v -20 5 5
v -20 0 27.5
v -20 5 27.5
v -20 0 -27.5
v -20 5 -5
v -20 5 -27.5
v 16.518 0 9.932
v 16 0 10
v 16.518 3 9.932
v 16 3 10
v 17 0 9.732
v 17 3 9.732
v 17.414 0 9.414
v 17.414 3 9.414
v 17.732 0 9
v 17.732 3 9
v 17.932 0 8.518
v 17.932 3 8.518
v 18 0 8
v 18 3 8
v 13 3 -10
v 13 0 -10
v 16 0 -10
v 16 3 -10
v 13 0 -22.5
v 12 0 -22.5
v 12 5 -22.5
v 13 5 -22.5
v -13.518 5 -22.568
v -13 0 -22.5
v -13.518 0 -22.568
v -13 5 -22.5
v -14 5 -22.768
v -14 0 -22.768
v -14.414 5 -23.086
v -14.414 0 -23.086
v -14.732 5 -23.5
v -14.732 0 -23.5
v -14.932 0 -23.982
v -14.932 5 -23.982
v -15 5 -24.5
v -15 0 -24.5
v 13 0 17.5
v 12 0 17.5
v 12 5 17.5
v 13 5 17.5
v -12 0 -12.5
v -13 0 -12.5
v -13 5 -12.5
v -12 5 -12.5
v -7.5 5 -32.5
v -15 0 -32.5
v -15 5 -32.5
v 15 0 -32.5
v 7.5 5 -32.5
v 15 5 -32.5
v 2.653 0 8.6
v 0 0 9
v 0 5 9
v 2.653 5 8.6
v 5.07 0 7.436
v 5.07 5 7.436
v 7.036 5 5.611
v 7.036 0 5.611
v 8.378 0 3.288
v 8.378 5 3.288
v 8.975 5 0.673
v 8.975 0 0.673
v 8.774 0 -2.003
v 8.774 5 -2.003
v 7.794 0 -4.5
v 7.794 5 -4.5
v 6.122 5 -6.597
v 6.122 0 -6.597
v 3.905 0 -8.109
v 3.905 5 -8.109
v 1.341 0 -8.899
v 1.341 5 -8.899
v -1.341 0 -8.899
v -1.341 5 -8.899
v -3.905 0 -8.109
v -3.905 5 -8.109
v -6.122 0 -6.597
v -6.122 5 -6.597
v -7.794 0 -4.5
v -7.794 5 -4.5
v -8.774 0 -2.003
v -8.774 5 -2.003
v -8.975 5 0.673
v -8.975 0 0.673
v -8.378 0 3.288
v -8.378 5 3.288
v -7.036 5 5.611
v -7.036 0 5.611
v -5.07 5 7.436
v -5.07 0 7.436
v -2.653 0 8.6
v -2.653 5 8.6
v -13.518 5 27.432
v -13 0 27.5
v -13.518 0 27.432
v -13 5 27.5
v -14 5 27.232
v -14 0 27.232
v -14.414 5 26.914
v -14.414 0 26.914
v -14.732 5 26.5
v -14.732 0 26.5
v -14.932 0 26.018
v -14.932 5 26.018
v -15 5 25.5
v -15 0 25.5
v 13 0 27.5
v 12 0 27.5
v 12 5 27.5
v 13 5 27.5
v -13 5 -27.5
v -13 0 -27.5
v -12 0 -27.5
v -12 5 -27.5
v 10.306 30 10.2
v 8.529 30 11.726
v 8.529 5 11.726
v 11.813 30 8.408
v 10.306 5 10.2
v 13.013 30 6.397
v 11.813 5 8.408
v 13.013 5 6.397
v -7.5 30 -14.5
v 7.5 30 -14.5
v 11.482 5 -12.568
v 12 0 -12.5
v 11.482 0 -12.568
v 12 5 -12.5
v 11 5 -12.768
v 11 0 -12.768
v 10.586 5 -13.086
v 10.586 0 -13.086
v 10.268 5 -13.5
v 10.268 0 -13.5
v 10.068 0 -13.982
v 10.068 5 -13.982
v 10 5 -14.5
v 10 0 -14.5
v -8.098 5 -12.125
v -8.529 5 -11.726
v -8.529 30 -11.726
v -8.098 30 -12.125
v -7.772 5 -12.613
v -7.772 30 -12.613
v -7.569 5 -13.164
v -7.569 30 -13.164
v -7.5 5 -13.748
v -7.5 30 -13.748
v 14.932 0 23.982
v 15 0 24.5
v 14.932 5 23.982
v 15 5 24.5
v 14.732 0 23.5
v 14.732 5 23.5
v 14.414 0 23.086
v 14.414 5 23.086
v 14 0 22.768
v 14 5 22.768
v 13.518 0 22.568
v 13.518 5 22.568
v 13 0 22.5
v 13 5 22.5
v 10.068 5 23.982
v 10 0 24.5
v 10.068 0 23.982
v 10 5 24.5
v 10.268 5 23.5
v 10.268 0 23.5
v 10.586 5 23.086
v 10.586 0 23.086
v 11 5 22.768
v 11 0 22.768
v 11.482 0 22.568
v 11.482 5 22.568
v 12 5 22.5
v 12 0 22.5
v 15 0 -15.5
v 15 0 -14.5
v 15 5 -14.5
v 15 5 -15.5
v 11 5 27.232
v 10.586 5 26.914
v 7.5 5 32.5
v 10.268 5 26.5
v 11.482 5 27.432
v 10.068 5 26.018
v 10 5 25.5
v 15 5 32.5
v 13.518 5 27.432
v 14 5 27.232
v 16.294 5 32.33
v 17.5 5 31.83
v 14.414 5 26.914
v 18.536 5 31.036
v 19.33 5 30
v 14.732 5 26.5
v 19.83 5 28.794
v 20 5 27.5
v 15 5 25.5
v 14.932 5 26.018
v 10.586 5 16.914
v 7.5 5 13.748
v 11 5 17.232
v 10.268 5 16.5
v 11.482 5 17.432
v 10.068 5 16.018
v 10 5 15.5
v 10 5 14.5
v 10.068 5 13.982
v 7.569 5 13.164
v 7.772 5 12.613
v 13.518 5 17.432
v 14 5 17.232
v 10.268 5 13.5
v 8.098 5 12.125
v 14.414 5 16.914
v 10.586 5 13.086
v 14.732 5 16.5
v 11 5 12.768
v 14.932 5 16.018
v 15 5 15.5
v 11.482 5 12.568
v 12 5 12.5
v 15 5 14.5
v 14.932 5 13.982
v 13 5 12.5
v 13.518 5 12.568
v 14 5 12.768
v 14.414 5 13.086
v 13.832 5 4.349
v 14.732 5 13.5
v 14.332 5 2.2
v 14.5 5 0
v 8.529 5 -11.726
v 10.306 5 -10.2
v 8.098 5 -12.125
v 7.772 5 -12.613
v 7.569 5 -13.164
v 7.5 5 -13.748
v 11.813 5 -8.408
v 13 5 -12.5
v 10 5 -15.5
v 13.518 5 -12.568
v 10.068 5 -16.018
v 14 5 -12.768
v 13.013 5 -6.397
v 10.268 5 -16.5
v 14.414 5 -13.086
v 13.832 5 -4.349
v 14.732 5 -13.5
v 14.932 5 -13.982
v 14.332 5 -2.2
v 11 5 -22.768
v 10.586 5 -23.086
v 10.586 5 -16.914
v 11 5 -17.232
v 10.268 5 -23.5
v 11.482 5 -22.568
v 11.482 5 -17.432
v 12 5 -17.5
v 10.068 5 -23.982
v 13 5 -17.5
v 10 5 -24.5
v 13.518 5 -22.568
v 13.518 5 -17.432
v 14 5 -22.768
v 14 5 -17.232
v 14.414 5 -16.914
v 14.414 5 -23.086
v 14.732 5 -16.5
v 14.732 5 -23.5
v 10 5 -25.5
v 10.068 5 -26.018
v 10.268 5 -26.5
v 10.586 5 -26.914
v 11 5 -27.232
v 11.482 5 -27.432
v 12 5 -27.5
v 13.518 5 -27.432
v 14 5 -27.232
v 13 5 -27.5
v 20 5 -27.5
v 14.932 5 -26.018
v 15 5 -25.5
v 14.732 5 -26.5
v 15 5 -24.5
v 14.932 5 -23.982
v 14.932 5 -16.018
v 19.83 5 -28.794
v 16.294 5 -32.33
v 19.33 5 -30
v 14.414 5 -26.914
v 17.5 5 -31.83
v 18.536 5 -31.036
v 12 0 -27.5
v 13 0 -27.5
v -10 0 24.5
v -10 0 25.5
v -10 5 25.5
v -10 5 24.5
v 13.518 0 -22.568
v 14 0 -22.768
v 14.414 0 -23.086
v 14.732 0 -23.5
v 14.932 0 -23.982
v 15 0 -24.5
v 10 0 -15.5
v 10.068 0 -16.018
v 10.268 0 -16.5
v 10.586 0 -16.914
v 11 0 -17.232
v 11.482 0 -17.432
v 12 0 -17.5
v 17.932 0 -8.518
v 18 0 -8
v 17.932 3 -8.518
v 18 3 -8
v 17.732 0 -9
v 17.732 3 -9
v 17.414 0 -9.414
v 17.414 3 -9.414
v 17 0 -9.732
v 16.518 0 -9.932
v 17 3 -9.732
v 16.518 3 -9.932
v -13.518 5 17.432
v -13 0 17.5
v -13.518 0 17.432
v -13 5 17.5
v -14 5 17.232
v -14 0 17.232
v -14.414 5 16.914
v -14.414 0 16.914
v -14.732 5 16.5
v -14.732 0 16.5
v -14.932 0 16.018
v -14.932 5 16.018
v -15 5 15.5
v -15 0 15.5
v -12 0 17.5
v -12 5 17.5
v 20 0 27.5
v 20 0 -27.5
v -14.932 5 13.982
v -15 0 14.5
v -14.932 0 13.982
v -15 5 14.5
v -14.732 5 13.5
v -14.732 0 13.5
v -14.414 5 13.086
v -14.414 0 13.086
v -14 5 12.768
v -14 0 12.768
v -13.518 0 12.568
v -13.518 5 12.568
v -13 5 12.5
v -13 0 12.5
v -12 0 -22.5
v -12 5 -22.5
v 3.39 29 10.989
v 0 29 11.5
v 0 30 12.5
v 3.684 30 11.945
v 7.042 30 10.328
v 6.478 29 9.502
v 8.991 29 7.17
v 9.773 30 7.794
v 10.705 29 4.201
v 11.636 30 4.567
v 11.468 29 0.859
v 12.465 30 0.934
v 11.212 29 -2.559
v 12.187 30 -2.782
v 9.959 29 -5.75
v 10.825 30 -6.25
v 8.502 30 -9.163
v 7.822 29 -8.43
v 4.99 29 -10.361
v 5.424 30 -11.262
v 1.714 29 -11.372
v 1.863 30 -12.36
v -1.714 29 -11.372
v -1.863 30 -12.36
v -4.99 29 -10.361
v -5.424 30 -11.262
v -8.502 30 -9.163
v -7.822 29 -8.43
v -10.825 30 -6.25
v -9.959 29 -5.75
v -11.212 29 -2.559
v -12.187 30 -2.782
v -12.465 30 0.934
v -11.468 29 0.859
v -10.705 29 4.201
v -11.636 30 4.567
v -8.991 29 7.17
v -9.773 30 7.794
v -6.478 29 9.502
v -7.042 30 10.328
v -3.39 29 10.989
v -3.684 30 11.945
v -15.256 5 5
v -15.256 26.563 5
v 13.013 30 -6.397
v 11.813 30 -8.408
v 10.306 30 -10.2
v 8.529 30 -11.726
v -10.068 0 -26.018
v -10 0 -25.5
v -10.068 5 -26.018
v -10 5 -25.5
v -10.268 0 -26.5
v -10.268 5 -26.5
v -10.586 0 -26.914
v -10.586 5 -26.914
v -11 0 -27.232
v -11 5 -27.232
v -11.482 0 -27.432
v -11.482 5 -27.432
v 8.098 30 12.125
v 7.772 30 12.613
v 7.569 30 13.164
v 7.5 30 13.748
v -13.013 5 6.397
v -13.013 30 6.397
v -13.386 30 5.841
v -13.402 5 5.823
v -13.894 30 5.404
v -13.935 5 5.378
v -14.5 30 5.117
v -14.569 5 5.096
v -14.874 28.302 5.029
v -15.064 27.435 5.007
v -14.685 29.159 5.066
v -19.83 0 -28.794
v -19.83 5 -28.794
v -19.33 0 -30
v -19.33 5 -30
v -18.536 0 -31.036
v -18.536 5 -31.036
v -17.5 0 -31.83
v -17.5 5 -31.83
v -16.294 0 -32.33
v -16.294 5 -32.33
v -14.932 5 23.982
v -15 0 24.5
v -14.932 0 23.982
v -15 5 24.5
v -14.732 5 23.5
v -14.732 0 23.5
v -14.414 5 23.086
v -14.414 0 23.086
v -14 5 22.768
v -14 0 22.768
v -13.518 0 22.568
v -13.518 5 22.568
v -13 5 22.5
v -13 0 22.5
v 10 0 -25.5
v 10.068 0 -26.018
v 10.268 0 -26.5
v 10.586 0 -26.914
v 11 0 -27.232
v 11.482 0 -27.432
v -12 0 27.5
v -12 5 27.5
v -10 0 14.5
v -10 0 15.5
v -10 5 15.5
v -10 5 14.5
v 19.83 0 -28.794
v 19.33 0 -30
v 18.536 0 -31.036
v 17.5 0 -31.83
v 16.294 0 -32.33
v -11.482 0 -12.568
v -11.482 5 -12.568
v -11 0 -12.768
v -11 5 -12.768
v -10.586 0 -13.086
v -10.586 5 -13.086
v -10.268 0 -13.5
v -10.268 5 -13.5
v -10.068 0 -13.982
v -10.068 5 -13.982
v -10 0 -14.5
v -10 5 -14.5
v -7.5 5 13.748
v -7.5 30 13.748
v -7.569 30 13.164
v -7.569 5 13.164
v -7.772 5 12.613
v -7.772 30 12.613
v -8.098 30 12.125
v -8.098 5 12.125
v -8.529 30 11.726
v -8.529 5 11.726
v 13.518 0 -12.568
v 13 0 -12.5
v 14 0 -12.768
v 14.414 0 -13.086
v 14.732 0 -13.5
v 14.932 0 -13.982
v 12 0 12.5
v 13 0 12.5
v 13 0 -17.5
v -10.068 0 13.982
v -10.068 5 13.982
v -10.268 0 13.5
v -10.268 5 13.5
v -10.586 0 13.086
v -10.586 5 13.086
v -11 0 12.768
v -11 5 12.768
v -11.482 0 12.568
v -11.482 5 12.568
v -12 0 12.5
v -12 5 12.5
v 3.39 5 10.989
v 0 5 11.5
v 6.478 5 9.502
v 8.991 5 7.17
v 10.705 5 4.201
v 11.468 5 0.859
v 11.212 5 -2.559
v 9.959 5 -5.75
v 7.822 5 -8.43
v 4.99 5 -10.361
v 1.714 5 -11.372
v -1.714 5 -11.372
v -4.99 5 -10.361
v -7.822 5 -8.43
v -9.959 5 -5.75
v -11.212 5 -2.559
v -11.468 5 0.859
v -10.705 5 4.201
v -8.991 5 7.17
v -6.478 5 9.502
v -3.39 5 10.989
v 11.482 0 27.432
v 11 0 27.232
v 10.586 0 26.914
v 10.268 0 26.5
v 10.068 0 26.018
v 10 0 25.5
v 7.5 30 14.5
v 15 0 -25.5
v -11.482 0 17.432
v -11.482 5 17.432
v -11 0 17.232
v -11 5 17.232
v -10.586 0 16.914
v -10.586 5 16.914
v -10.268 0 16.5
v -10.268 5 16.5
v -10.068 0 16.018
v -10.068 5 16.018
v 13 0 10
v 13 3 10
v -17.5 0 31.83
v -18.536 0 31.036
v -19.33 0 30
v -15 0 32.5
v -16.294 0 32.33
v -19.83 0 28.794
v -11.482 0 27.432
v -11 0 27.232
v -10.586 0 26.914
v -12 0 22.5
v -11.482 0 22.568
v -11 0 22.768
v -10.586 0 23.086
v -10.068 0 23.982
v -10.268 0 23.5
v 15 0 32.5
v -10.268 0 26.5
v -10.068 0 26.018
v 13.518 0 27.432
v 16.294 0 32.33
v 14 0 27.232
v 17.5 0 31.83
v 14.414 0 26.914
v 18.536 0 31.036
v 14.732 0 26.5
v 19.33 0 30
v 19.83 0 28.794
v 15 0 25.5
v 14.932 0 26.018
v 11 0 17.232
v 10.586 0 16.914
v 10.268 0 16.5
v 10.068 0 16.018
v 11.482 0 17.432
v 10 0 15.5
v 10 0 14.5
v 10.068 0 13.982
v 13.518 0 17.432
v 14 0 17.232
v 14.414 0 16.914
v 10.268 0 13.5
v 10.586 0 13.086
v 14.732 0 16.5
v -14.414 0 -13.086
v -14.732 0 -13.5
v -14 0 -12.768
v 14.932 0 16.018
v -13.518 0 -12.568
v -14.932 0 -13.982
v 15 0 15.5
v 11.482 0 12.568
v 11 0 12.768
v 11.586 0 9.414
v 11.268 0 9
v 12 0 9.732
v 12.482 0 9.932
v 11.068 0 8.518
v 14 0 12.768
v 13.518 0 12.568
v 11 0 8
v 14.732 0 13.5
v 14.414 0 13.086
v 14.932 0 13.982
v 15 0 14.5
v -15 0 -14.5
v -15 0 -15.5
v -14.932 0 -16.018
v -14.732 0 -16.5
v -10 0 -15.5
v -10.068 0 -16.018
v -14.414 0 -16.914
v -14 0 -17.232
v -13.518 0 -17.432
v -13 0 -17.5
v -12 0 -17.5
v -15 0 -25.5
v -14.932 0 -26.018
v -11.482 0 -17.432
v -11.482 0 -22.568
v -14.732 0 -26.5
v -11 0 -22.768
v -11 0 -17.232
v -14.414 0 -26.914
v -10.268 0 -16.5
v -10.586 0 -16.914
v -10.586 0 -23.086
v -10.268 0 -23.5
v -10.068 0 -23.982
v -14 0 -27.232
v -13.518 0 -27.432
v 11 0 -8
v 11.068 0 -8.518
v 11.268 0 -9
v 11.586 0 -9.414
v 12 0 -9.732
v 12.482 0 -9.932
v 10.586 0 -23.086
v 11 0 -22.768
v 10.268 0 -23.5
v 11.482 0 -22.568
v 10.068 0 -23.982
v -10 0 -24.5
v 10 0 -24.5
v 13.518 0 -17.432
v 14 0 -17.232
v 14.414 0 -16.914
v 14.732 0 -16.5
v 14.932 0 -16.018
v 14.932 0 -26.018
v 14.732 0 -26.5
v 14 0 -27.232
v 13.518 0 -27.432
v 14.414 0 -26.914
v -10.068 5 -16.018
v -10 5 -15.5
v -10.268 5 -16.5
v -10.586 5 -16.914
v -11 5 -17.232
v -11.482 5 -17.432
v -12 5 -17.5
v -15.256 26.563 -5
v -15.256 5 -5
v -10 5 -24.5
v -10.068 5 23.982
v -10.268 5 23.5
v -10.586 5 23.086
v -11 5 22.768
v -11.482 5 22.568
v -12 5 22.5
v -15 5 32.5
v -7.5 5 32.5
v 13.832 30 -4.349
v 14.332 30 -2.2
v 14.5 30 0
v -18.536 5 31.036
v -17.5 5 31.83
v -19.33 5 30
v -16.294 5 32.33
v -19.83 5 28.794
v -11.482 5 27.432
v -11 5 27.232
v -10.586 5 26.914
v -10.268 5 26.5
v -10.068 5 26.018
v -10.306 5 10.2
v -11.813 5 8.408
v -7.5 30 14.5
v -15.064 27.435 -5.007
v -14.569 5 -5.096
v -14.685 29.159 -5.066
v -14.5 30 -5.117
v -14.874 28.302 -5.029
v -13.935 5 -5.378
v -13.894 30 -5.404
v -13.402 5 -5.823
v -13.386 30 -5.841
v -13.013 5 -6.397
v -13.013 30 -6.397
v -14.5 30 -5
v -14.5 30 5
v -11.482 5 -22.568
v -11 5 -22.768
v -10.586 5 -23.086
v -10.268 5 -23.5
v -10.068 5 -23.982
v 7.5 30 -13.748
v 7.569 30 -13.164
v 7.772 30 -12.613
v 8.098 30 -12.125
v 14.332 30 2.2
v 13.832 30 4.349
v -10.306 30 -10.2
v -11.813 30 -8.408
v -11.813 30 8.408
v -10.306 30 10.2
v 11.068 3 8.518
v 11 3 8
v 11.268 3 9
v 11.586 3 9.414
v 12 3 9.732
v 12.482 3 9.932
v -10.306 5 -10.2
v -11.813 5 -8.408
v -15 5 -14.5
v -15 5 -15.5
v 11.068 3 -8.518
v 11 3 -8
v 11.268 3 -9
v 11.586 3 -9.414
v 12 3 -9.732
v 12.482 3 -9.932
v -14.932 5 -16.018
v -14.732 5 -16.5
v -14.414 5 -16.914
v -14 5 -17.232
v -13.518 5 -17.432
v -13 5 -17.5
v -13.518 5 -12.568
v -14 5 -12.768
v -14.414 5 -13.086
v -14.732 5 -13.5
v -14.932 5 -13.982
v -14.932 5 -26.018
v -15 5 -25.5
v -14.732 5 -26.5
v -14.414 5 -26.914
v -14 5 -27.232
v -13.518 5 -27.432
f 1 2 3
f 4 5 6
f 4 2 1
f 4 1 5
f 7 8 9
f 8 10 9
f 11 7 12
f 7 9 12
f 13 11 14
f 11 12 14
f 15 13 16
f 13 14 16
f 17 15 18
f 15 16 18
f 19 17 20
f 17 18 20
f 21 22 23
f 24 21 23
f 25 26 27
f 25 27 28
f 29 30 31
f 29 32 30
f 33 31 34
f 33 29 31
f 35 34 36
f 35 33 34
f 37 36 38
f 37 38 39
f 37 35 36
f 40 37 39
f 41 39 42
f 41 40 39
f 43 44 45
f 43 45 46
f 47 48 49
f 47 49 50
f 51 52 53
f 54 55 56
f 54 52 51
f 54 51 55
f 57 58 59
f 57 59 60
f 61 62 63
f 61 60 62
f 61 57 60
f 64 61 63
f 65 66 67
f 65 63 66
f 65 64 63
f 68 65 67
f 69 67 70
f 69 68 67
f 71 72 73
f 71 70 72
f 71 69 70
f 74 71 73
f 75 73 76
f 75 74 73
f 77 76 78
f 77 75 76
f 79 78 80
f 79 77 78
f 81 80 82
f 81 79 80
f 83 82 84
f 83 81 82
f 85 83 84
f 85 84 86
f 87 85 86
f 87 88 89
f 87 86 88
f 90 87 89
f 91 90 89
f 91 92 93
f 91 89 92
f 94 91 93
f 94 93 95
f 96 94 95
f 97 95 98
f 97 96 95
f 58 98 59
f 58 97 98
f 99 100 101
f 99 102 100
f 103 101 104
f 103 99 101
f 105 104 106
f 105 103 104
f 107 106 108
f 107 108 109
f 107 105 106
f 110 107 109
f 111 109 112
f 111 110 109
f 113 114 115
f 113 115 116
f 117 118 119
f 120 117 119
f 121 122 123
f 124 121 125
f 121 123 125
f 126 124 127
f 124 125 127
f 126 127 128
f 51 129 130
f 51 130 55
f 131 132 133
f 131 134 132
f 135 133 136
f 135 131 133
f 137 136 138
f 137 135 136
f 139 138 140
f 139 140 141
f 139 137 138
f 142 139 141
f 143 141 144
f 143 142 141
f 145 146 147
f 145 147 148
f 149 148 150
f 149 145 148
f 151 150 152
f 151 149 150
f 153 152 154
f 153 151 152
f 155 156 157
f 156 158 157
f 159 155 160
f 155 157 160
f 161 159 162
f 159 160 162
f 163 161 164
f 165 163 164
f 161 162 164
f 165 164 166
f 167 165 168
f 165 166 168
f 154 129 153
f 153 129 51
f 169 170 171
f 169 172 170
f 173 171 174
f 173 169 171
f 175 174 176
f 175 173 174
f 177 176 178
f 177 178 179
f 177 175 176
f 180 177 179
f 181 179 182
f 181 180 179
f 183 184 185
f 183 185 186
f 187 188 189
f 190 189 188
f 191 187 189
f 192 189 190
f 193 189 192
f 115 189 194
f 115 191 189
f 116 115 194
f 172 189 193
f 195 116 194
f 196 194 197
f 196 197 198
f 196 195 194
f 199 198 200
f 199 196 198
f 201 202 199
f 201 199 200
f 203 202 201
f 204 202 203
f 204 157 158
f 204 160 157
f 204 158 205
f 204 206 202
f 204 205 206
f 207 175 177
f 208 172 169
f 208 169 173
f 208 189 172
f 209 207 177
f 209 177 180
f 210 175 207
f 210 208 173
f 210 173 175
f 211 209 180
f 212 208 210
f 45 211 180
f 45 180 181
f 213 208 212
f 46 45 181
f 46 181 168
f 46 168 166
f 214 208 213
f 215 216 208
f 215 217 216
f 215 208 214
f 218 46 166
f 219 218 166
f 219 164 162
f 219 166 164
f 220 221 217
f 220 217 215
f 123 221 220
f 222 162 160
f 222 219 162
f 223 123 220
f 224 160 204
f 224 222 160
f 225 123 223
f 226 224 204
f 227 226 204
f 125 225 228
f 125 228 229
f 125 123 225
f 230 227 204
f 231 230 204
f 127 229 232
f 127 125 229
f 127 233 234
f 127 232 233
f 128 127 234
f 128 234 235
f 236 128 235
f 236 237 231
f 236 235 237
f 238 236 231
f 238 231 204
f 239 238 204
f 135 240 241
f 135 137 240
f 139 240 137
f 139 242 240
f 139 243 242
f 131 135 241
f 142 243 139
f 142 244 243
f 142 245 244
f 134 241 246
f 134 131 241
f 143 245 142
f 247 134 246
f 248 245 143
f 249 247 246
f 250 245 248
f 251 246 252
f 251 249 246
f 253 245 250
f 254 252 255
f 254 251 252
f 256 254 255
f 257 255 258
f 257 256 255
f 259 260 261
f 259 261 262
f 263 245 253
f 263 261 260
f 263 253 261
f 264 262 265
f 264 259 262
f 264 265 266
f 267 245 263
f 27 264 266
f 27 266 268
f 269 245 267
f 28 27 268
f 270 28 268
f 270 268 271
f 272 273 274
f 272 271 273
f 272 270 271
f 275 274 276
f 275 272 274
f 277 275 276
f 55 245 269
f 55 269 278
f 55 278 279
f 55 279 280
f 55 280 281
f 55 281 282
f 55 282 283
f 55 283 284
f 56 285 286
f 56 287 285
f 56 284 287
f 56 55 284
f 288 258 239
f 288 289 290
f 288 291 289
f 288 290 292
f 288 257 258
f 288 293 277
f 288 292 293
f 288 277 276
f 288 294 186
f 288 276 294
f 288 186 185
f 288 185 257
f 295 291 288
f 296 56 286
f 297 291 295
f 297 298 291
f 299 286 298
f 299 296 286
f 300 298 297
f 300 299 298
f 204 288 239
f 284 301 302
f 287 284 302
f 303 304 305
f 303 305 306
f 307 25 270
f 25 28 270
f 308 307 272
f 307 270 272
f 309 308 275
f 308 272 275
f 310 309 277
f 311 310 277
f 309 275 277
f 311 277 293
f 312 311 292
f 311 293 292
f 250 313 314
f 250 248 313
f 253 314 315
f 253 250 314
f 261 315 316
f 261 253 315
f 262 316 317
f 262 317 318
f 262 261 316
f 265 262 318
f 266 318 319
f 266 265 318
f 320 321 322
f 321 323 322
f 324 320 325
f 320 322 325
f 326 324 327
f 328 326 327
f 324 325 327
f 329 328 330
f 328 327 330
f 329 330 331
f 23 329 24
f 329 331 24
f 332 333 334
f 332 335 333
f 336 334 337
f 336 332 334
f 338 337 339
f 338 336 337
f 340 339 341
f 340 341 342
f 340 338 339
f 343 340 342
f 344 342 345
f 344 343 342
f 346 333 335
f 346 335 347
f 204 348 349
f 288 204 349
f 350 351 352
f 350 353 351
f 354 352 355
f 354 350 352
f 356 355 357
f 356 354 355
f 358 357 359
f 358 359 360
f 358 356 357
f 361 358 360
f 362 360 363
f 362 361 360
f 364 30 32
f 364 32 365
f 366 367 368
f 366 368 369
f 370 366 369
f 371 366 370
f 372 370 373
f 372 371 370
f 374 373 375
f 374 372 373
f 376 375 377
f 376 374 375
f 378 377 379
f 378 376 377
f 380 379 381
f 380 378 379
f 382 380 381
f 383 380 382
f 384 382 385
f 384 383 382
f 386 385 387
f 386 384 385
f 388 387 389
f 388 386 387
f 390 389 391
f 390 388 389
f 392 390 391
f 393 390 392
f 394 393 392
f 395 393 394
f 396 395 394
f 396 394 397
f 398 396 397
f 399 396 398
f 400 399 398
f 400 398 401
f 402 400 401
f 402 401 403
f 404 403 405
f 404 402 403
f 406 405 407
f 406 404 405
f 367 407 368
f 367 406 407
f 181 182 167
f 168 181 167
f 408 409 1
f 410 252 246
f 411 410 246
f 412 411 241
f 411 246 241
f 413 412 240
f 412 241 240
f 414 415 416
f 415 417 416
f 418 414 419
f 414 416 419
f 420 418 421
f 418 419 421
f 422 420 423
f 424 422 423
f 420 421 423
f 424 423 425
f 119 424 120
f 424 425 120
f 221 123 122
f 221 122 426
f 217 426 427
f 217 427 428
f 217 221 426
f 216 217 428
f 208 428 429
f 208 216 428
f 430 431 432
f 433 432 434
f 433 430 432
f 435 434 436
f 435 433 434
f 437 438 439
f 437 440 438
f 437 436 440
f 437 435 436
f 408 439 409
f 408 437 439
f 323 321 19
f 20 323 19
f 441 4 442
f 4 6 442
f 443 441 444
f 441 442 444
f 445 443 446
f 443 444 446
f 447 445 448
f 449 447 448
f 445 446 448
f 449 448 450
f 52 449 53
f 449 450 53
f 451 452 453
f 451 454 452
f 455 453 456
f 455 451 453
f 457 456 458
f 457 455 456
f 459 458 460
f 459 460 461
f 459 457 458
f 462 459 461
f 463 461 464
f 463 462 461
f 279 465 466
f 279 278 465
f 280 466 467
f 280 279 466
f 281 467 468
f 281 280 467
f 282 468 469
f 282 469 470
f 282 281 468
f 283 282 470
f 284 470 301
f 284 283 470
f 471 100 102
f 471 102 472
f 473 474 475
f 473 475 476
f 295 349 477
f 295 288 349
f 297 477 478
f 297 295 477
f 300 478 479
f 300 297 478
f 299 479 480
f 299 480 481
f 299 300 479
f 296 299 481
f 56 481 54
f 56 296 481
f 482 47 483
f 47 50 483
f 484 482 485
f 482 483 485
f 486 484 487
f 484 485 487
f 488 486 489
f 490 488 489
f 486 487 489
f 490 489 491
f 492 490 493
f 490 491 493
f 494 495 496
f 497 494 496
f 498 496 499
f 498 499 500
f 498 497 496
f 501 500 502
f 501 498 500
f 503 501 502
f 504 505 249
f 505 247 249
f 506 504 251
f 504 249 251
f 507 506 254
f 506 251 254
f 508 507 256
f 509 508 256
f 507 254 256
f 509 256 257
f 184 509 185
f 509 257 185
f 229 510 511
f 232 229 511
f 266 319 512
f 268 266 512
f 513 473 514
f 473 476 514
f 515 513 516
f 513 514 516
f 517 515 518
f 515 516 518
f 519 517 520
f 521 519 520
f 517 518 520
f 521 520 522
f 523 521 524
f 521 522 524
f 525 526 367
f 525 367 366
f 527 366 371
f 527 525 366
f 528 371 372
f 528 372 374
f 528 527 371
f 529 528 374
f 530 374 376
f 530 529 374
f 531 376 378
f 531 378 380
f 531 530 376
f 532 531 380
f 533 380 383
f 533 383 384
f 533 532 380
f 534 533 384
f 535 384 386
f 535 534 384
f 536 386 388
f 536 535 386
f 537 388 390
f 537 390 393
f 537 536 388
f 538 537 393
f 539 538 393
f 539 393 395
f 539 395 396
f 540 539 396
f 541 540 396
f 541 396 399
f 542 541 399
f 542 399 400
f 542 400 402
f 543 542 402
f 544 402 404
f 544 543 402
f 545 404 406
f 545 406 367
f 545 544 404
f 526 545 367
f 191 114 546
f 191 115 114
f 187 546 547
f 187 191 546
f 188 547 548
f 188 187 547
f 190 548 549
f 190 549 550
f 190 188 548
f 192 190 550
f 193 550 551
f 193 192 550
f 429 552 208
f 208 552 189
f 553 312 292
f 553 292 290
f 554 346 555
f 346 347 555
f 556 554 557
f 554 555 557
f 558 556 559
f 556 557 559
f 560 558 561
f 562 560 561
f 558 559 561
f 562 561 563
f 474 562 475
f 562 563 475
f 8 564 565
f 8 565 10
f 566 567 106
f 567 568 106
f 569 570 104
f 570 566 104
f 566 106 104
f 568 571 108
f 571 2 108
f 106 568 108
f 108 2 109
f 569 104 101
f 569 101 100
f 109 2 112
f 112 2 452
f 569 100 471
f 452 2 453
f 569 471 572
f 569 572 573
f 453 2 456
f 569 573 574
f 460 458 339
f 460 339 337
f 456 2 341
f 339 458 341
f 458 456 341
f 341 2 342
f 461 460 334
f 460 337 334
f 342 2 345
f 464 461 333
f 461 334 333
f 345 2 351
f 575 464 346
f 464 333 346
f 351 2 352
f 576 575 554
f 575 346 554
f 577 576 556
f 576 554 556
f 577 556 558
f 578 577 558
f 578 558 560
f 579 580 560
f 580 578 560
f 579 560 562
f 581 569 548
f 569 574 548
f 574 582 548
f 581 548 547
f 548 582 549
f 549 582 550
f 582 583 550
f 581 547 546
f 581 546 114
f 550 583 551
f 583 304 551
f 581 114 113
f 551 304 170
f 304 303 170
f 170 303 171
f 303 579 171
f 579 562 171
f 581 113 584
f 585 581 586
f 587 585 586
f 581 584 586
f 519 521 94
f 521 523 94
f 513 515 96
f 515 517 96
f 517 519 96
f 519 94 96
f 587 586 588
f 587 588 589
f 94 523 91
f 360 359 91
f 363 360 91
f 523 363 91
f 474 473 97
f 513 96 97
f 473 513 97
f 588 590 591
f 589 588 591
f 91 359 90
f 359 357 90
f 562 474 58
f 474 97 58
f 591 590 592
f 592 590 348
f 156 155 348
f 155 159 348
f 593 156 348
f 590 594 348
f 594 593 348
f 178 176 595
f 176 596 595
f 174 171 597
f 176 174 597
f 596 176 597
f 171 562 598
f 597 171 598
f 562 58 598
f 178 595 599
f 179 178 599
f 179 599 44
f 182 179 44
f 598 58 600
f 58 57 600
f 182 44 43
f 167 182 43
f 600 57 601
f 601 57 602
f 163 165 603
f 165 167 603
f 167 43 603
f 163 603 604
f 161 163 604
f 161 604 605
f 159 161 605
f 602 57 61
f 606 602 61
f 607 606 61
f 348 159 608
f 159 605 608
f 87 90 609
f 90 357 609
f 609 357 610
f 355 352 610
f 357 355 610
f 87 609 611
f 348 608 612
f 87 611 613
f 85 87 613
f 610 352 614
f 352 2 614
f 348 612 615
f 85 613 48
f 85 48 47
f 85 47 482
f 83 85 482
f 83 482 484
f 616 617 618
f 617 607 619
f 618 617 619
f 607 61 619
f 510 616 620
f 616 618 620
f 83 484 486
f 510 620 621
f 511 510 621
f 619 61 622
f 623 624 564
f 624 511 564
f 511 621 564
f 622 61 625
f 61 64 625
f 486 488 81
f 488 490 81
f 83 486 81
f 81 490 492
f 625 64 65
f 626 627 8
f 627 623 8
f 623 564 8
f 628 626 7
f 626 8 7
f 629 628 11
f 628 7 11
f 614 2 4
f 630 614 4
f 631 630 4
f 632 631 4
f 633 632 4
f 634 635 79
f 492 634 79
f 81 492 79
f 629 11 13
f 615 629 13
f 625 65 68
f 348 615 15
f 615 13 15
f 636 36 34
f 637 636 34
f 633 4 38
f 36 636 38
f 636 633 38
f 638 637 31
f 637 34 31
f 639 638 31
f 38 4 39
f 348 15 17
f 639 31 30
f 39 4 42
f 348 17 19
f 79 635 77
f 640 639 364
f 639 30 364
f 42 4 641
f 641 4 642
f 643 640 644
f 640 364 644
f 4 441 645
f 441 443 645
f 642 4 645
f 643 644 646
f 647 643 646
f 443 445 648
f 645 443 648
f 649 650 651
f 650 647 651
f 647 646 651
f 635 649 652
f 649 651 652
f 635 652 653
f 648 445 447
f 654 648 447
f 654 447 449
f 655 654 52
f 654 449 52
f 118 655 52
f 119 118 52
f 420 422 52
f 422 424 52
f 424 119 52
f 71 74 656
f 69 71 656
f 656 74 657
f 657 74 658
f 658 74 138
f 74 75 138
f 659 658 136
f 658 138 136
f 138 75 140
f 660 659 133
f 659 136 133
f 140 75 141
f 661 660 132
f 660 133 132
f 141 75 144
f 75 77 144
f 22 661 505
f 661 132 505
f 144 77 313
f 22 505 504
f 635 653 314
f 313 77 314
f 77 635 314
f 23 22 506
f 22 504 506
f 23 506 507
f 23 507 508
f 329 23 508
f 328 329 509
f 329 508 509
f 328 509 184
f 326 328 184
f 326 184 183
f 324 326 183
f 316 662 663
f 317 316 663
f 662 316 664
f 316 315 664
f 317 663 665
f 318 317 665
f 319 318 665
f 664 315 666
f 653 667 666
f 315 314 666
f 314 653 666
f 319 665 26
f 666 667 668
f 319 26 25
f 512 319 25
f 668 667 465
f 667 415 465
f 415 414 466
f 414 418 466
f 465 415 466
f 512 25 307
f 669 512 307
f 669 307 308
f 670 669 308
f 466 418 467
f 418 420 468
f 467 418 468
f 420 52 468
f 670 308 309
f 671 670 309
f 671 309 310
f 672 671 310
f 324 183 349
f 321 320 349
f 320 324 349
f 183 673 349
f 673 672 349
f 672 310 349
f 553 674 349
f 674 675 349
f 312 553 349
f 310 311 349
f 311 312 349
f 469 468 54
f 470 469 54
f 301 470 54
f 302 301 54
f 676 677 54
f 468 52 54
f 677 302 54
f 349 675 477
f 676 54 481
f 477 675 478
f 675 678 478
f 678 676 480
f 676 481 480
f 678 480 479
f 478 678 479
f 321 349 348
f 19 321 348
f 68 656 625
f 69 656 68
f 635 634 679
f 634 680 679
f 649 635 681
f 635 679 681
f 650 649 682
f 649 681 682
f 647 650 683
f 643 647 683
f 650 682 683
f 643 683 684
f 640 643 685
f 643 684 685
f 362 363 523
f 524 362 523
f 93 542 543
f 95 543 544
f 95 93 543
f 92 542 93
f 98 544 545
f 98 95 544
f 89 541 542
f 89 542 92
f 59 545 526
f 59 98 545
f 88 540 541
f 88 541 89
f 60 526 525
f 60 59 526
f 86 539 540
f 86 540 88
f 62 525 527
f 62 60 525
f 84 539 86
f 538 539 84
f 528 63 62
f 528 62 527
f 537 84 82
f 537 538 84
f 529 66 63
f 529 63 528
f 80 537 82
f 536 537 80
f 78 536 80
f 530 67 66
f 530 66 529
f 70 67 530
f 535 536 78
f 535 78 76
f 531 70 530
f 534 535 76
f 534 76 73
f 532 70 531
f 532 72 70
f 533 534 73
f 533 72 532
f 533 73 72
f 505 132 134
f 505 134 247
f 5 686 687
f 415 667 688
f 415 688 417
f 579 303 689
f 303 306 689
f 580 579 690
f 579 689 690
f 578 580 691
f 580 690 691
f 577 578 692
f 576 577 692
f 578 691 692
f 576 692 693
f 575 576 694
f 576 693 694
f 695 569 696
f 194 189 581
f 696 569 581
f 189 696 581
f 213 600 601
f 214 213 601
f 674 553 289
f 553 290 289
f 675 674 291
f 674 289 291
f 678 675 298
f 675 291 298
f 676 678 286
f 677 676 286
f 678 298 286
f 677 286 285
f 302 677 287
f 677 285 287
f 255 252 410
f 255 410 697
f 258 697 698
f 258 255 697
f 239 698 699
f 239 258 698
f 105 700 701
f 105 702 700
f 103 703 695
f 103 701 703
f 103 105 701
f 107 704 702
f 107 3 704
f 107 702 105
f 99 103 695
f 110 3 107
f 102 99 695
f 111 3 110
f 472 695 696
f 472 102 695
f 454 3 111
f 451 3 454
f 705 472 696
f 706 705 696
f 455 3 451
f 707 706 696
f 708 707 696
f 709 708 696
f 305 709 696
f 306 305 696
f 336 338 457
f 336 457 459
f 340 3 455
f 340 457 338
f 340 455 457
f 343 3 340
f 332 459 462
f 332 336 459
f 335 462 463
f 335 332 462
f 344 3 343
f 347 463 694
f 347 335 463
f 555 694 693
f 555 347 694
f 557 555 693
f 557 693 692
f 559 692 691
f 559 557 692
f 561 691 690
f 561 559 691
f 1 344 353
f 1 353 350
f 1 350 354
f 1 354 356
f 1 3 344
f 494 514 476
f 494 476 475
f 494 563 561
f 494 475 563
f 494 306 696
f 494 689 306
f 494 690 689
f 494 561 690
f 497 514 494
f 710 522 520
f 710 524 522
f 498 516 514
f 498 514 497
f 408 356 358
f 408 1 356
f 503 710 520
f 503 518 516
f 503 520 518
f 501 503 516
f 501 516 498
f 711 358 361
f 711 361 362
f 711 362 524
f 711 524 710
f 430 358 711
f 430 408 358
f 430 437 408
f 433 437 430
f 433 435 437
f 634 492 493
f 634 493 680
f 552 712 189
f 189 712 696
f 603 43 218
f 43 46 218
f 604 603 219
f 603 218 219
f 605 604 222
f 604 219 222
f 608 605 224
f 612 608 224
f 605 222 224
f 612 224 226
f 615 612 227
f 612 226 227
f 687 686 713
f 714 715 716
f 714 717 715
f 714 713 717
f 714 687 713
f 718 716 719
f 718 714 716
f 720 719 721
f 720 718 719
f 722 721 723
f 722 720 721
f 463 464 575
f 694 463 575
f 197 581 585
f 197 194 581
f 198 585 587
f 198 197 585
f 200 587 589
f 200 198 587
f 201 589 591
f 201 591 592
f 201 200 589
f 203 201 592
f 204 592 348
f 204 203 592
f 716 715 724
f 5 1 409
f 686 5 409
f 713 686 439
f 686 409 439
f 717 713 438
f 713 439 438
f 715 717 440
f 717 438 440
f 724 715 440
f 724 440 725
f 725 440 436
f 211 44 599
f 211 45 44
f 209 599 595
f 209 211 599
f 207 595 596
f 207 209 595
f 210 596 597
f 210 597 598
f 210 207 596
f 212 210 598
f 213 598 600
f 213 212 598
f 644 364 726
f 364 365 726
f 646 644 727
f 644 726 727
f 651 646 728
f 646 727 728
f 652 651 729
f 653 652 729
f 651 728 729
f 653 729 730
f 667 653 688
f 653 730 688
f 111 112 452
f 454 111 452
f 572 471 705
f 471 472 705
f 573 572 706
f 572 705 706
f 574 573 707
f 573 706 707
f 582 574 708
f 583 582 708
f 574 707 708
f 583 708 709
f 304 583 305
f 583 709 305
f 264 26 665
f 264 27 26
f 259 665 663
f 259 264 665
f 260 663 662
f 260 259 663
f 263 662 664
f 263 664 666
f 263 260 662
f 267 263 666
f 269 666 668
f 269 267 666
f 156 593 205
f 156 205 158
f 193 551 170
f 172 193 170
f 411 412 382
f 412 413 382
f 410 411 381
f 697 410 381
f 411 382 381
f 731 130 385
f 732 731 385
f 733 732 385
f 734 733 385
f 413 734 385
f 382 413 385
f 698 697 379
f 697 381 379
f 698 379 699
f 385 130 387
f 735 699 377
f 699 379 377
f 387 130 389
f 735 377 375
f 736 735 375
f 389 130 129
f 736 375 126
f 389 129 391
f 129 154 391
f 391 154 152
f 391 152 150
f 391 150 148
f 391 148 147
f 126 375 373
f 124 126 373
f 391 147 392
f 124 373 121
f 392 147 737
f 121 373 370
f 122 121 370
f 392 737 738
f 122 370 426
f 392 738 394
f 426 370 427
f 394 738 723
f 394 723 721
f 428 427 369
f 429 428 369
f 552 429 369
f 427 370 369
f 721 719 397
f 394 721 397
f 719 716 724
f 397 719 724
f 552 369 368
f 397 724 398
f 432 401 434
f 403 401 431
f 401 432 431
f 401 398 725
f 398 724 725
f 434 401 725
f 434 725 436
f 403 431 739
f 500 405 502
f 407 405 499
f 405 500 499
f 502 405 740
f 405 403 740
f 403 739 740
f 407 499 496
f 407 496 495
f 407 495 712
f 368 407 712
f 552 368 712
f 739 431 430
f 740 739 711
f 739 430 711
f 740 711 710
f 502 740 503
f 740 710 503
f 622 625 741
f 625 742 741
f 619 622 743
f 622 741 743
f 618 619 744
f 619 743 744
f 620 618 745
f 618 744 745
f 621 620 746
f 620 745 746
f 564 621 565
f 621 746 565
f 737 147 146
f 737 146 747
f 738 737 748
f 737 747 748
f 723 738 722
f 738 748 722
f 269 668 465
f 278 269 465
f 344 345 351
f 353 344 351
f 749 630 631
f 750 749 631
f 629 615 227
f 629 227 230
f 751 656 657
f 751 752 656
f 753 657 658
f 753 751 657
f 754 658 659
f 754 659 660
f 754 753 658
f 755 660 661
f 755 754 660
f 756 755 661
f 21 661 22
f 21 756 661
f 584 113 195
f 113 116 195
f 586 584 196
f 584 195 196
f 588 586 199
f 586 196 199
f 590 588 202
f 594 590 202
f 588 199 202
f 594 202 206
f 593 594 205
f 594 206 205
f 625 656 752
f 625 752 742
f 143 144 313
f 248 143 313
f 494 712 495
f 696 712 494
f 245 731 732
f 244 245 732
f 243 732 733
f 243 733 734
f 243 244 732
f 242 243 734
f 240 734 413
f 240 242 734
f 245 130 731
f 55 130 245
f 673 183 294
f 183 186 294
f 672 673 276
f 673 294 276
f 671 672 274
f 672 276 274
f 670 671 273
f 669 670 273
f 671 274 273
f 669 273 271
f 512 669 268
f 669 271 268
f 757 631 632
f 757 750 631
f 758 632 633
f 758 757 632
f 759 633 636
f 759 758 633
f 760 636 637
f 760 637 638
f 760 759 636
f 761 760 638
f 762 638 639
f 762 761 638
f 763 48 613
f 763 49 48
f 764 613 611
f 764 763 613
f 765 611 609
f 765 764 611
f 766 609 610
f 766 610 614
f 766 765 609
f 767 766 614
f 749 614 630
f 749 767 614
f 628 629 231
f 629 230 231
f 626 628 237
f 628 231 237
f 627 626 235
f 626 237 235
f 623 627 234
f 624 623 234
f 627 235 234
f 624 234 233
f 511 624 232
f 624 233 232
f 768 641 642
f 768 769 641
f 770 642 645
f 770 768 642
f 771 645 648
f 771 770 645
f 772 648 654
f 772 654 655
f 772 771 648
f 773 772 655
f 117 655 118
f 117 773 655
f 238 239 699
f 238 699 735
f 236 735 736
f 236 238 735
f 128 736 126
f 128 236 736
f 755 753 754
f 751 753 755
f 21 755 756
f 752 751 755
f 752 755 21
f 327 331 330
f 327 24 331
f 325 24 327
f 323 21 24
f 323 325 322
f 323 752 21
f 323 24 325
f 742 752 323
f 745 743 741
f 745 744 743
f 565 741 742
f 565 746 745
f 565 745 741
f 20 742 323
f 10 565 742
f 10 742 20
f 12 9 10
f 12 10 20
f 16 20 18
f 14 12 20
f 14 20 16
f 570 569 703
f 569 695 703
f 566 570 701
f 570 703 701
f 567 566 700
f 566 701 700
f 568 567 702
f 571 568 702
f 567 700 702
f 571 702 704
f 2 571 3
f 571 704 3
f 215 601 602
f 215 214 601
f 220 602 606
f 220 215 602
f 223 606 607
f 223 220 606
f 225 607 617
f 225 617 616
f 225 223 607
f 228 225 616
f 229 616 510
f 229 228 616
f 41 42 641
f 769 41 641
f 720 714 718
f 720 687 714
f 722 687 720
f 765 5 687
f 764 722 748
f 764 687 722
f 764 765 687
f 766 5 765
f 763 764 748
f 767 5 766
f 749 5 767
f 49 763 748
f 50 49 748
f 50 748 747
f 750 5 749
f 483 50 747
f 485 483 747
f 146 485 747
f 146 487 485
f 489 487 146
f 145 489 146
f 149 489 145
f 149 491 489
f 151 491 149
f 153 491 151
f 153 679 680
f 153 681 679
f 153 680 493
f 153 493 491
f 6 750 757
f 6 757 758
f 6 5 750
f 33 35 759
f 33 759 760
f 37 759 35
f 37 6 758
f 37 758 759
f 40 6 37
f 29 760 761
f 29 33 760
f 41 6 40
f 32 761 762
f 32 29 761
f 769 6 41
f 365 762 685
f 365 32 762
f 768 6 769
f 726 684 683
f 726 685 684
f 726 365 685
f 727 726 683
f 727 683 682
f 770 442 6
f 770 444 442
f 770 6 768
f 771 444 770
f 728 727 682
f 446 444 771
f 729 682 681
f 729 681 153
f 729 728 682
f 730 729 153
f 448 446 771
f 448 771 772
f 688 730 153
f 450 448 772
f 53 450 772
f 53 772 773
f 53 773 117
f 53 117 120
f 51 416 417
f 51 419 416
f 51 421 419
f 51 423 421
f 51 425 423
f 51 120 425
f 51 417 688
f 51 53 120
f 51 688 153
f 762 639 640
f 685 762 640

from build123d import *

# Parameters (mm, degrees)
SKETCH1_W                       = 40
SKETCH1_H                       = 65
SKETCH1_W_2                     = 5
SKETCH1_H_2                     = 5
MOUNTBASE_DEPTH                 = 5
SKETCH4_R                       = 11.5
PIPEBASE_DEPTH                  = 25
RIB3_REACH                      = 50.541
SKETCH6_WALL_W                  = 124.680290668
SKETCH6_WALL_H                  = 10
RIB5_REACH                      = 50.541
SKETCH7_WALL_W                  = 129.888282796
SKETCH7_WALL_H                  = 15
BASEFILLET_R                    = 5
PIPEFILLET_R                    = 2.5
INNERMATERIALREMOVAL_DEPTH      = 46.620718977
INNERMATERIALREMOVAL_DEPTH_BACK = 46.620718977
SKETCH8_R                       = 9
PIPECHAMFER_SIZE                = 1
FILLET5_R                       = 2
CUT_EXTRUDE2_START              = -25
CUT_EXTRUDE2_DEPTH              = 25
SKETCH10_W                      = 7
SKETCH10_H                      = 20
CUT_EXTRUDE3_DEPTH              = 3
FILLET6_R                       = 2


with BuildPart() as part:
    # Sketch1 → MountBase (new body)
    with BuildSketch(Plane(origin=(0, 0, 0), x_dir=(1, 0, 0), z_dir=(0, 1, 0))):
        Rectangle(SKETCH1_W, SKETCH1_H)
        with Locations((-12.5, 15)):
            Rectangle(SKETCH1_W_2, SKETCH1_H_2, mode=Mode.SUBTRACT)
        with Locations((-12.5, -15)):
            Rectangle(SKETCH1_W_2, SKETCH1_H_2, mode=Mode.SUBTRACT)
        with Locations((12.5, 15)):
            Rectangle(SKETCH1_W_2, SKETCH1_H_2, mode=Mode.SUBTRACT)
        with Locations((12.5, -15)):
            Rectangle(SKETCH1_W_2, SKETCH1_H_2, mode=Mode.SUBTRACT)
        with Locations((-12.5, -25)):
            Rectangle(SKETCH1_W_2, SKETCH1_H_2, mode=Mode.SUBTRACT)
        with Locations((12.5, -25)):
            Rectangle(SKETCH1_W_2, SKETCH1_H_2, mode=Mode.SUBTRACT)
        with Locations((-12.5, 25)):
            Rectangle(SKETCH1_W_2, SKETCH1_H_2, mode=Mode.SUBTRACT)
        with Locations((12.5, 25)):
            Rectangle(SKETCH1_W_2, SKETCH1_H_2, mode=Mode.SUBTRACT)
    extrude(amount=MOUNTBASE_DEPTH)

    # Sketch4 → PipeBase (add)
    with BuildSketch(Plane(origin=(0, 5, 0), x_dir=(1, 0, 0), z_dir=(0, 1, 0))):
        with BuildLine():
            Line((-14.5, 5), (-14.5, -5))
            Line((-14.5, -5), (-13.610657589, -5))
            ThreePointArc((-13.610657589, -5), (-11.186634071, -9.225465742), (-7.5, -12.409673646))
            Line((-7.5, -12.409673646), (-7.5, -14.5))
            Line((-7.5, -14.5), (7.5, -14.5))
            Line((7.5, -14.5), (7.5, -12.409673646))
            ThreePointArc((7.5, -12.409673646), (11.186634071, -9.225465742), (13.610657589, -5))
            Line((13.610657589, -5), (14.5, -5))
            Line((14.5, -5), (14.5, 5))
            Line((14.5, 5), (13.610657589, 5))
            ThreePointArc((13.610657589, 5), (11.186634071, 9.225465742), (7.5, 12.409673646))
            Line((7.5, 12.409673646), (7.5, 14.5))
            Line((7.5, 14.5), (-7.5, 14.5))
            Line((-7.5, 14.5), (-7.5, 12.409673646))
            ThreePointArc((-7.5, 12.409673646), (-11.186634071, 9.225465742), (-13.610657589, 5))
            Line((-13.610657589, 5), (-14.5, 5))
        make_face()
        with Locations(Location((0, 0, 0), (0, 0, 270))):
            Circle(SKETCH4_R, mode=Mode.SUBTRACT)
    extrude(amount=PIPEBASE_DEPTH)

    # Sketch6 wall → Rib3 (add, up to next)
    with BuildSketch(Plane(origin=(-17.25, 17.5, 0), x_dir=(-0.214861782675, -0.976644466705, 0), z_dir=(0.976644466705, -0.214861782675, 0)), mode=Mode.PRIVATE) as rib3_sk1:
        Rectangle(SKETCH6_WALL_W, SKETCH6_WALL_H)
    rib3_tool1 = extrude(rib3_sk1.sketch, amount=RIB3_REACH, mode=Mode.PRIVATE) - part.part
    rib3 = rib3_tool1.solids().sort_by_distance((-17.25, 17.5, 0))[0]
    add(rib3)

    # Mirror1: Rib3 across plane
    add(rib3.mirror(Plane(origin=(0, 0, 0), x_dir=(0, 0, 1), z_dir=(1, 0, 0))))

    # Sketch7 wall → Rib5 (add, up to next)
    with BuildSketch(Plane(origin=(0, 17.5, 23.5), x_dir=(0, -0.811534341451, 0.584304725845), z_dir=(0, -0.584304725845, -0.811534341451)), mode=Mode.PRIVATE) as rib5_sk1:
        Rectangle(SKETCH7_WALL_W, SKETCH7_WALL_H)
    rib5_tool1 = extrude(rib5_sk1.sketch, amount=RIB5_REACH, mode=Mode.PRIVATE) - part.part
    rib5 = rib5_tool1.solids().sort_by_distance((0, 17.5, 23.5))[0]
    add(rib5)

    # Mirror2: Rib5 across plane
    add(rib5.mirror(Plane.XY))

    # BaseFillet
    basefillet_edges = [part.edges().sort_by_distance(p)[0] for p in [
        (20, 2.5, 32.5),
        (-20, 2.5, 32.5),
        (-20, 2.5, -32.5),
        (20, 2.5, -32.5),
    ]]
    fillet(basefillet_edges, radius=BASEFILLET_R)

    # PipeFillet
    # the kernel refuses this fillet: 2.5 mm, written as the material it adds along each edge
    with BuildSketch(Plane(origin=(-13.610657589, 0.886278216, -5), x_dir=(-1, 0, 0), z_dir=(0, 1, 0))) as pipefillet_piece_1_section:
        with BuildLine():
            CenterArc((1.645488714, -2.5), PIPEFILLET_R, 90, 63.821031296)
            ThreePointArc((-0.598062213, -1.397058824), (-0.280715993, -0.706369867), (0, 0))
            Line((0, 0), (1.645488714, 0))
        make_face()
    pipefillet_piece_1 = extrude(amount=29.113721784, mode=Mode.PRIVATE)
    pipefillet_piece_1 = split(pipefillet_piece_1, bisect_by=Plane(origin=(-20.148077302, 4.326921354, -5.304724049), z_dir=(0.976644466705111, -0.2148617826750244, 0)), keep=Keep.TOP, mode=Mode.PRIVATE)
    add(pipefillet_piece_1)
    with BuildSketch(Plane(origin=(-7.5, 1.654866403, -12.409673646), x_dir=(-0.8330213423374977, 0, 0.5532408546105696), z_dir=(0, 1, 0))) as pipefillet_piece_2:
        with BuildLine():
            CenterArc((1.342287528, -2.497729208), PIPEFILLET_R, 92.442244575, 53.968120928)
            Line((-0.740265828, -1.114627072), (0, 0))
            ThreePointArc((0, 0), (0.617878386, -0.013170592), (1.235756772, 0))
        make_face()
    extrude(amount=28.345133597)
    with BuildSketch(Plane(origin=(-13.610657589, 0.886278216, 5), x_dir=(-1, 0, 0), z_dir=(0, 1, 0))) as pipefillet_piece_3_section:
        with BuildLine():
            CenterArc((1.645488714, 2.5), PIPEFILLET_R, 206.178968704, 63.821031296)
            ThreePointArc((-0.598062213, 1.397058824), (-0.280715993, 0.706369867), (0, 0))
            Line((0, 0), (1.645488714, 0))
        make_face()
    pipefillet_piece_3 = extrude(amount=29.113721784, mode=Mode.PRIVATE)
    pipefillet_piece_3 = split(pipefillet_piece_3, bisect_by=Plane(origin=(-20.148077302, 4.326921354, 5.304724049), z_dir=(0.976644466705111, -0.2148617826750244, 0)), keep=Keep.TOP, mode=Mode.PRIVATE)
    add(pipefillet_piece_3)
    with BuildSketch(Plane(origin=(-7.5, 1.654866403, 12.409673646), x_dir=(-0.8330213423374981, 0, -0.5532408546105689), z_dir=(0, 1, 0))) as pipefillet_piece_4:
        with BuildLine():
            CenterArc((1.342287528, 2.497729208), PIPEFILLET_R, 213.589634497, 53.968120928)
            Line((-0.740265828, 1.114627072), (0, 0))
            ThreePointArc((0, 0), (0.617878386, 0.013170592), (1.235756772, 0))
        make_face()
    extrude(amount=28.345133597)
    with BuildSketch(Plane(origin=(7.5, 1.654866403, 12.409673646), x_dir=(0, 0, 1), z_dir=(0, 1, 0))) as pipefillet_piece_5:
        with BuildLine():
            CenterArc((1.338053439, 2.5), PIPEFILLET_R, 216.031879072, 53.968120928)
            ThreePointArc((-0.683671132, 1.029411765), (-0.330864182, 0.521992392), (0, 0))
            Line((0, 0), (1.338053439, 0))
        make_face()
    extrude(amount=28.345133597)
    with BuildSketch(Plane(origin=(13.610657589, 0.886278216, 5), x_dir=(1, 0, 0), z_dir=(0, 1, 0))) as pipefillet_piece_6_section:
        with BuildLine():
            CenterArc((1.645488714, -2.5), PIPEFILLET_R, 90, 63.821031296)
            ThreePointArc((-0.598062213, -1.397058824), (-0.280715993, -0.706369867), (0, 0))
            Line((0, 0), (1.645488714, 0))
        make_face()
    pipefillet_piece_6 = extrude(amount=29.113721784, mode=Mode.PRIVATE)
    pipefillet_piece_6 = split(pipefillet_piece_6, bisect_by=Plane(origin=(20.148077302, 4.326921354, 5.304724049), z_dir=(-0.976644466705111, -0.21486178267502437, 0)), keep=Keep.TOP, mode=Mode.PRIVATE)
    add(pipefillet_piece_6)
    with BuildSketch(Plane(origin=(13.610657589, 0.886278216, -5), x_dir=(-0.3935427494511154, 0, -0.9193063169338371), z_dir=(0, 1, 0))) as pipefillet_piece_7_section:
        with BuildLine():
            CenterArc((1.65069564, -2.496565042), PIPEFILLET_R, 93.003848679, 63.821031296)
            Line((-0.647570153, -1.512708169), (0, 0))
            ThreePointArc((0, 0), (0.759844025, -0.019922754), (1.519688049, 0))
        make_face()
    pipefillet_piece_7 = extrude(amount=29.113721784, mode=Mode.PRIVATE)
    pipefillet_piece_7 = split(pipefillet_piece_7, bisect_by=Plane(origin=(20.148077302, 4.326921354, -5.304724049), z_dir=(-0.976644466705111, -0.21486178267502437, 0)), keep=Keep.TOP, mode=Mode.PRIVATE)
    add(pipefillet_piece_7)
    with BuildSketch(Plane(origin=(7.5, 1.654866403, -12.409673646), x_dir=(0, 0, -1), z_dir=(0, 1, 0))) as pipefillet_piece_8:
        with BuildLine():
            CenterArc((1.338053439, -2.5), PIPEFILLET_R, 90, 53.968120928)
            ThreePointArc((-0.683671132, -1.029411765), (-0.330864182, -0.521992392), (0, 0))
            Line((0, 0), (1.338053439, 0))
        make_face()
    extrude(amount=28.345133597)

    # Sketch8 → InnerMaterialRemoval (cut, two sides: drawn at the far end of the back side and taken through both)
    with BuildSketch(Plane(origin=(0, 5, 0), x_dir=(1, 0, 0), z_dir=(0, 1, 0)).offset(-INNERMATERIALREMOVAL_DEPTH_BACK)):
        with Locations(Location((0, 0, 0), (0, 0, 270))):
            Circle(SKETCH8_R)
    extrude(amount=INNERMATERIALREMOVAL_DEPTH + INNERMATERIALREMOVAL_DEPTH_BACK, mode=Mode.SUBTRACT)

    # PipeChamfer
    pipechamfer_edges = [part.edges().sort_by_distance(p)[0] for p in [
        (0, 30, -11.5),
    ]]
    chamfer(pipechamfer_edges, length=PIPECHAMFER_SIZE)

    # Fillet5
    fillet5_edges = [part.edges().sort_by_distance(p)[0] for p in [
        (10, 2.5, -27.5),
        (10, 2.5, -22.5),
        (15, 2.5, -22.5),
        (15, 2.5, -27.5),
        (-10, 2.5, -12.5),
        (-10, 2.5, -17.5),
        (-15, 2.5, -17.5),
        (-15, 2.5, -12.5),
        (-10, 2.5, 17.5),
        (-10, 2.5, 12.5),
        (-15, 2.5, 12.5),
        (-15, 2.5, 17.5),
        (15, 2.5, -12.5),
        (15, 2.5, -17.5),
        (10, 2.5, -17.5),
        (10, 2.5, -12.5),
        (15, 2.5, 17.5),
        (15, 2.5, 12.5),
        (10, 2.5, 12.5),
        (10, 2.5, 17.5),
        (-10, 2.5, 27.5),
        (-10, 2.5, 22.5),
        (-15, 2.5, 22.5),
        (-15, 2.5, 27.5),
        (15, 2.5, 27.5),
        (15, 2.5, 22.5),
        (10, 2.5, 22.5),
        (10, 2.5, 27.5),
        (-15, 2.5, -27.5),
        (-15, 2.5, -22.5),
        (-10, 2.5, -22.5),
        (-10, 2.5, -27.5),
    ]]
    fillet(fillet5_edges, radius=FILLET5_R)

    # Sketch9 → Cut-Extrude2 (cut)
    with BuildSketch(Plane(origin=(0, 30, 0), x_dir=(1, 0, 0), z_dir=(0, 1, 0)).offset(CUT_EXTRUDE2_START)):
        with BuildLine():
            Line((7.5, -13.747727085), (8.27770049, -13.747727085))
            Line((8.27770049, -13.747727085), (20, -7.665046243))
            Line((20, -7.665046243), (20, 7.665046243))
            Line((20, 7.665046243), (8.27770049, 13.747727085))
            Line((8.27770049, 13.747727085), (7.5, 13.747727085))
            ThreePointArc((7.5, 13.747727085), (7.772168028, 12.613370569), (8.529411765, 11.726002514))
            ThreePointArc((8.529411765, 11.726002514), (11.095671594, 9.334670422), (13.012595376, 6.397058824))
            ThreePointArc((13.012595376, 6.397058824), (13.625464362, 5.605039206), (14.5, 5.11709363))
            Line((14.5, 5.11709363), (14.5, -5.11709363))
            ThreePointArc((14.5, -5.11709363), (13.625464362, -5.605039206), (13.012595376, -6.397058824))
            ThreePointArc((13.012595376, -6.397058824), (11.095671594, -9.334670422), (8.529411765, -11.726002514))
            ThreePointArc((8.529411765, -11.726002514), (7.772168028, -12.613370569), (7.5, -13.747727085))
        make_face()
        with BuildLine():
            ThreePointArc((14.5, 5.11709363), (13.625464362, 5.605039206), (13.012595376, 6.397058824))
            ThreePointArc((13.012595376, 6.397058824), (14.123254458, 3.283851934), (14.5, 0))
            Line((14.5, 0), (14.5, 5.11709363))
        make_face()
        with BuildLine():
            Line((14.5, -5.11709363), (14.5, 0))
            ThreePointArc((14.5, 0), (14.123254458, -3.283851934), (13.012595376, -6.397058824))
            ThreePointArc((13.012595376, -6.397058824), (13.625464362, -5.605039206), (14.5, -5.11709363))
        make_face()
    extrude(amount=CUT_EXTRUDE2_DEPTH, mode=Mode.SUBTRACT)

    # Sketch10 → Cut-Extrude3 (cut)
    with BuildSketch(Plane.XZ):
        with Locations((14.5, 0)):
            Rectangle(SKETCH10_W, SKETCH10_H)
    extrude(amount=-CUT_EXTRUDE3_DEPTH, mode=Mode.SUBTRACT)

    # Fillet6
    fillet6_edges = [part.edges().sort_by_distance(p)[0] for p in [
        (18, 1.5, 10),
        (18, 1.5, -10),
        (11, 1.5, -10),
        (11, 1.5, 10),
    ]]
    fillet(fillet6_edges, radius=FILLET6_R)


solid = part.part
